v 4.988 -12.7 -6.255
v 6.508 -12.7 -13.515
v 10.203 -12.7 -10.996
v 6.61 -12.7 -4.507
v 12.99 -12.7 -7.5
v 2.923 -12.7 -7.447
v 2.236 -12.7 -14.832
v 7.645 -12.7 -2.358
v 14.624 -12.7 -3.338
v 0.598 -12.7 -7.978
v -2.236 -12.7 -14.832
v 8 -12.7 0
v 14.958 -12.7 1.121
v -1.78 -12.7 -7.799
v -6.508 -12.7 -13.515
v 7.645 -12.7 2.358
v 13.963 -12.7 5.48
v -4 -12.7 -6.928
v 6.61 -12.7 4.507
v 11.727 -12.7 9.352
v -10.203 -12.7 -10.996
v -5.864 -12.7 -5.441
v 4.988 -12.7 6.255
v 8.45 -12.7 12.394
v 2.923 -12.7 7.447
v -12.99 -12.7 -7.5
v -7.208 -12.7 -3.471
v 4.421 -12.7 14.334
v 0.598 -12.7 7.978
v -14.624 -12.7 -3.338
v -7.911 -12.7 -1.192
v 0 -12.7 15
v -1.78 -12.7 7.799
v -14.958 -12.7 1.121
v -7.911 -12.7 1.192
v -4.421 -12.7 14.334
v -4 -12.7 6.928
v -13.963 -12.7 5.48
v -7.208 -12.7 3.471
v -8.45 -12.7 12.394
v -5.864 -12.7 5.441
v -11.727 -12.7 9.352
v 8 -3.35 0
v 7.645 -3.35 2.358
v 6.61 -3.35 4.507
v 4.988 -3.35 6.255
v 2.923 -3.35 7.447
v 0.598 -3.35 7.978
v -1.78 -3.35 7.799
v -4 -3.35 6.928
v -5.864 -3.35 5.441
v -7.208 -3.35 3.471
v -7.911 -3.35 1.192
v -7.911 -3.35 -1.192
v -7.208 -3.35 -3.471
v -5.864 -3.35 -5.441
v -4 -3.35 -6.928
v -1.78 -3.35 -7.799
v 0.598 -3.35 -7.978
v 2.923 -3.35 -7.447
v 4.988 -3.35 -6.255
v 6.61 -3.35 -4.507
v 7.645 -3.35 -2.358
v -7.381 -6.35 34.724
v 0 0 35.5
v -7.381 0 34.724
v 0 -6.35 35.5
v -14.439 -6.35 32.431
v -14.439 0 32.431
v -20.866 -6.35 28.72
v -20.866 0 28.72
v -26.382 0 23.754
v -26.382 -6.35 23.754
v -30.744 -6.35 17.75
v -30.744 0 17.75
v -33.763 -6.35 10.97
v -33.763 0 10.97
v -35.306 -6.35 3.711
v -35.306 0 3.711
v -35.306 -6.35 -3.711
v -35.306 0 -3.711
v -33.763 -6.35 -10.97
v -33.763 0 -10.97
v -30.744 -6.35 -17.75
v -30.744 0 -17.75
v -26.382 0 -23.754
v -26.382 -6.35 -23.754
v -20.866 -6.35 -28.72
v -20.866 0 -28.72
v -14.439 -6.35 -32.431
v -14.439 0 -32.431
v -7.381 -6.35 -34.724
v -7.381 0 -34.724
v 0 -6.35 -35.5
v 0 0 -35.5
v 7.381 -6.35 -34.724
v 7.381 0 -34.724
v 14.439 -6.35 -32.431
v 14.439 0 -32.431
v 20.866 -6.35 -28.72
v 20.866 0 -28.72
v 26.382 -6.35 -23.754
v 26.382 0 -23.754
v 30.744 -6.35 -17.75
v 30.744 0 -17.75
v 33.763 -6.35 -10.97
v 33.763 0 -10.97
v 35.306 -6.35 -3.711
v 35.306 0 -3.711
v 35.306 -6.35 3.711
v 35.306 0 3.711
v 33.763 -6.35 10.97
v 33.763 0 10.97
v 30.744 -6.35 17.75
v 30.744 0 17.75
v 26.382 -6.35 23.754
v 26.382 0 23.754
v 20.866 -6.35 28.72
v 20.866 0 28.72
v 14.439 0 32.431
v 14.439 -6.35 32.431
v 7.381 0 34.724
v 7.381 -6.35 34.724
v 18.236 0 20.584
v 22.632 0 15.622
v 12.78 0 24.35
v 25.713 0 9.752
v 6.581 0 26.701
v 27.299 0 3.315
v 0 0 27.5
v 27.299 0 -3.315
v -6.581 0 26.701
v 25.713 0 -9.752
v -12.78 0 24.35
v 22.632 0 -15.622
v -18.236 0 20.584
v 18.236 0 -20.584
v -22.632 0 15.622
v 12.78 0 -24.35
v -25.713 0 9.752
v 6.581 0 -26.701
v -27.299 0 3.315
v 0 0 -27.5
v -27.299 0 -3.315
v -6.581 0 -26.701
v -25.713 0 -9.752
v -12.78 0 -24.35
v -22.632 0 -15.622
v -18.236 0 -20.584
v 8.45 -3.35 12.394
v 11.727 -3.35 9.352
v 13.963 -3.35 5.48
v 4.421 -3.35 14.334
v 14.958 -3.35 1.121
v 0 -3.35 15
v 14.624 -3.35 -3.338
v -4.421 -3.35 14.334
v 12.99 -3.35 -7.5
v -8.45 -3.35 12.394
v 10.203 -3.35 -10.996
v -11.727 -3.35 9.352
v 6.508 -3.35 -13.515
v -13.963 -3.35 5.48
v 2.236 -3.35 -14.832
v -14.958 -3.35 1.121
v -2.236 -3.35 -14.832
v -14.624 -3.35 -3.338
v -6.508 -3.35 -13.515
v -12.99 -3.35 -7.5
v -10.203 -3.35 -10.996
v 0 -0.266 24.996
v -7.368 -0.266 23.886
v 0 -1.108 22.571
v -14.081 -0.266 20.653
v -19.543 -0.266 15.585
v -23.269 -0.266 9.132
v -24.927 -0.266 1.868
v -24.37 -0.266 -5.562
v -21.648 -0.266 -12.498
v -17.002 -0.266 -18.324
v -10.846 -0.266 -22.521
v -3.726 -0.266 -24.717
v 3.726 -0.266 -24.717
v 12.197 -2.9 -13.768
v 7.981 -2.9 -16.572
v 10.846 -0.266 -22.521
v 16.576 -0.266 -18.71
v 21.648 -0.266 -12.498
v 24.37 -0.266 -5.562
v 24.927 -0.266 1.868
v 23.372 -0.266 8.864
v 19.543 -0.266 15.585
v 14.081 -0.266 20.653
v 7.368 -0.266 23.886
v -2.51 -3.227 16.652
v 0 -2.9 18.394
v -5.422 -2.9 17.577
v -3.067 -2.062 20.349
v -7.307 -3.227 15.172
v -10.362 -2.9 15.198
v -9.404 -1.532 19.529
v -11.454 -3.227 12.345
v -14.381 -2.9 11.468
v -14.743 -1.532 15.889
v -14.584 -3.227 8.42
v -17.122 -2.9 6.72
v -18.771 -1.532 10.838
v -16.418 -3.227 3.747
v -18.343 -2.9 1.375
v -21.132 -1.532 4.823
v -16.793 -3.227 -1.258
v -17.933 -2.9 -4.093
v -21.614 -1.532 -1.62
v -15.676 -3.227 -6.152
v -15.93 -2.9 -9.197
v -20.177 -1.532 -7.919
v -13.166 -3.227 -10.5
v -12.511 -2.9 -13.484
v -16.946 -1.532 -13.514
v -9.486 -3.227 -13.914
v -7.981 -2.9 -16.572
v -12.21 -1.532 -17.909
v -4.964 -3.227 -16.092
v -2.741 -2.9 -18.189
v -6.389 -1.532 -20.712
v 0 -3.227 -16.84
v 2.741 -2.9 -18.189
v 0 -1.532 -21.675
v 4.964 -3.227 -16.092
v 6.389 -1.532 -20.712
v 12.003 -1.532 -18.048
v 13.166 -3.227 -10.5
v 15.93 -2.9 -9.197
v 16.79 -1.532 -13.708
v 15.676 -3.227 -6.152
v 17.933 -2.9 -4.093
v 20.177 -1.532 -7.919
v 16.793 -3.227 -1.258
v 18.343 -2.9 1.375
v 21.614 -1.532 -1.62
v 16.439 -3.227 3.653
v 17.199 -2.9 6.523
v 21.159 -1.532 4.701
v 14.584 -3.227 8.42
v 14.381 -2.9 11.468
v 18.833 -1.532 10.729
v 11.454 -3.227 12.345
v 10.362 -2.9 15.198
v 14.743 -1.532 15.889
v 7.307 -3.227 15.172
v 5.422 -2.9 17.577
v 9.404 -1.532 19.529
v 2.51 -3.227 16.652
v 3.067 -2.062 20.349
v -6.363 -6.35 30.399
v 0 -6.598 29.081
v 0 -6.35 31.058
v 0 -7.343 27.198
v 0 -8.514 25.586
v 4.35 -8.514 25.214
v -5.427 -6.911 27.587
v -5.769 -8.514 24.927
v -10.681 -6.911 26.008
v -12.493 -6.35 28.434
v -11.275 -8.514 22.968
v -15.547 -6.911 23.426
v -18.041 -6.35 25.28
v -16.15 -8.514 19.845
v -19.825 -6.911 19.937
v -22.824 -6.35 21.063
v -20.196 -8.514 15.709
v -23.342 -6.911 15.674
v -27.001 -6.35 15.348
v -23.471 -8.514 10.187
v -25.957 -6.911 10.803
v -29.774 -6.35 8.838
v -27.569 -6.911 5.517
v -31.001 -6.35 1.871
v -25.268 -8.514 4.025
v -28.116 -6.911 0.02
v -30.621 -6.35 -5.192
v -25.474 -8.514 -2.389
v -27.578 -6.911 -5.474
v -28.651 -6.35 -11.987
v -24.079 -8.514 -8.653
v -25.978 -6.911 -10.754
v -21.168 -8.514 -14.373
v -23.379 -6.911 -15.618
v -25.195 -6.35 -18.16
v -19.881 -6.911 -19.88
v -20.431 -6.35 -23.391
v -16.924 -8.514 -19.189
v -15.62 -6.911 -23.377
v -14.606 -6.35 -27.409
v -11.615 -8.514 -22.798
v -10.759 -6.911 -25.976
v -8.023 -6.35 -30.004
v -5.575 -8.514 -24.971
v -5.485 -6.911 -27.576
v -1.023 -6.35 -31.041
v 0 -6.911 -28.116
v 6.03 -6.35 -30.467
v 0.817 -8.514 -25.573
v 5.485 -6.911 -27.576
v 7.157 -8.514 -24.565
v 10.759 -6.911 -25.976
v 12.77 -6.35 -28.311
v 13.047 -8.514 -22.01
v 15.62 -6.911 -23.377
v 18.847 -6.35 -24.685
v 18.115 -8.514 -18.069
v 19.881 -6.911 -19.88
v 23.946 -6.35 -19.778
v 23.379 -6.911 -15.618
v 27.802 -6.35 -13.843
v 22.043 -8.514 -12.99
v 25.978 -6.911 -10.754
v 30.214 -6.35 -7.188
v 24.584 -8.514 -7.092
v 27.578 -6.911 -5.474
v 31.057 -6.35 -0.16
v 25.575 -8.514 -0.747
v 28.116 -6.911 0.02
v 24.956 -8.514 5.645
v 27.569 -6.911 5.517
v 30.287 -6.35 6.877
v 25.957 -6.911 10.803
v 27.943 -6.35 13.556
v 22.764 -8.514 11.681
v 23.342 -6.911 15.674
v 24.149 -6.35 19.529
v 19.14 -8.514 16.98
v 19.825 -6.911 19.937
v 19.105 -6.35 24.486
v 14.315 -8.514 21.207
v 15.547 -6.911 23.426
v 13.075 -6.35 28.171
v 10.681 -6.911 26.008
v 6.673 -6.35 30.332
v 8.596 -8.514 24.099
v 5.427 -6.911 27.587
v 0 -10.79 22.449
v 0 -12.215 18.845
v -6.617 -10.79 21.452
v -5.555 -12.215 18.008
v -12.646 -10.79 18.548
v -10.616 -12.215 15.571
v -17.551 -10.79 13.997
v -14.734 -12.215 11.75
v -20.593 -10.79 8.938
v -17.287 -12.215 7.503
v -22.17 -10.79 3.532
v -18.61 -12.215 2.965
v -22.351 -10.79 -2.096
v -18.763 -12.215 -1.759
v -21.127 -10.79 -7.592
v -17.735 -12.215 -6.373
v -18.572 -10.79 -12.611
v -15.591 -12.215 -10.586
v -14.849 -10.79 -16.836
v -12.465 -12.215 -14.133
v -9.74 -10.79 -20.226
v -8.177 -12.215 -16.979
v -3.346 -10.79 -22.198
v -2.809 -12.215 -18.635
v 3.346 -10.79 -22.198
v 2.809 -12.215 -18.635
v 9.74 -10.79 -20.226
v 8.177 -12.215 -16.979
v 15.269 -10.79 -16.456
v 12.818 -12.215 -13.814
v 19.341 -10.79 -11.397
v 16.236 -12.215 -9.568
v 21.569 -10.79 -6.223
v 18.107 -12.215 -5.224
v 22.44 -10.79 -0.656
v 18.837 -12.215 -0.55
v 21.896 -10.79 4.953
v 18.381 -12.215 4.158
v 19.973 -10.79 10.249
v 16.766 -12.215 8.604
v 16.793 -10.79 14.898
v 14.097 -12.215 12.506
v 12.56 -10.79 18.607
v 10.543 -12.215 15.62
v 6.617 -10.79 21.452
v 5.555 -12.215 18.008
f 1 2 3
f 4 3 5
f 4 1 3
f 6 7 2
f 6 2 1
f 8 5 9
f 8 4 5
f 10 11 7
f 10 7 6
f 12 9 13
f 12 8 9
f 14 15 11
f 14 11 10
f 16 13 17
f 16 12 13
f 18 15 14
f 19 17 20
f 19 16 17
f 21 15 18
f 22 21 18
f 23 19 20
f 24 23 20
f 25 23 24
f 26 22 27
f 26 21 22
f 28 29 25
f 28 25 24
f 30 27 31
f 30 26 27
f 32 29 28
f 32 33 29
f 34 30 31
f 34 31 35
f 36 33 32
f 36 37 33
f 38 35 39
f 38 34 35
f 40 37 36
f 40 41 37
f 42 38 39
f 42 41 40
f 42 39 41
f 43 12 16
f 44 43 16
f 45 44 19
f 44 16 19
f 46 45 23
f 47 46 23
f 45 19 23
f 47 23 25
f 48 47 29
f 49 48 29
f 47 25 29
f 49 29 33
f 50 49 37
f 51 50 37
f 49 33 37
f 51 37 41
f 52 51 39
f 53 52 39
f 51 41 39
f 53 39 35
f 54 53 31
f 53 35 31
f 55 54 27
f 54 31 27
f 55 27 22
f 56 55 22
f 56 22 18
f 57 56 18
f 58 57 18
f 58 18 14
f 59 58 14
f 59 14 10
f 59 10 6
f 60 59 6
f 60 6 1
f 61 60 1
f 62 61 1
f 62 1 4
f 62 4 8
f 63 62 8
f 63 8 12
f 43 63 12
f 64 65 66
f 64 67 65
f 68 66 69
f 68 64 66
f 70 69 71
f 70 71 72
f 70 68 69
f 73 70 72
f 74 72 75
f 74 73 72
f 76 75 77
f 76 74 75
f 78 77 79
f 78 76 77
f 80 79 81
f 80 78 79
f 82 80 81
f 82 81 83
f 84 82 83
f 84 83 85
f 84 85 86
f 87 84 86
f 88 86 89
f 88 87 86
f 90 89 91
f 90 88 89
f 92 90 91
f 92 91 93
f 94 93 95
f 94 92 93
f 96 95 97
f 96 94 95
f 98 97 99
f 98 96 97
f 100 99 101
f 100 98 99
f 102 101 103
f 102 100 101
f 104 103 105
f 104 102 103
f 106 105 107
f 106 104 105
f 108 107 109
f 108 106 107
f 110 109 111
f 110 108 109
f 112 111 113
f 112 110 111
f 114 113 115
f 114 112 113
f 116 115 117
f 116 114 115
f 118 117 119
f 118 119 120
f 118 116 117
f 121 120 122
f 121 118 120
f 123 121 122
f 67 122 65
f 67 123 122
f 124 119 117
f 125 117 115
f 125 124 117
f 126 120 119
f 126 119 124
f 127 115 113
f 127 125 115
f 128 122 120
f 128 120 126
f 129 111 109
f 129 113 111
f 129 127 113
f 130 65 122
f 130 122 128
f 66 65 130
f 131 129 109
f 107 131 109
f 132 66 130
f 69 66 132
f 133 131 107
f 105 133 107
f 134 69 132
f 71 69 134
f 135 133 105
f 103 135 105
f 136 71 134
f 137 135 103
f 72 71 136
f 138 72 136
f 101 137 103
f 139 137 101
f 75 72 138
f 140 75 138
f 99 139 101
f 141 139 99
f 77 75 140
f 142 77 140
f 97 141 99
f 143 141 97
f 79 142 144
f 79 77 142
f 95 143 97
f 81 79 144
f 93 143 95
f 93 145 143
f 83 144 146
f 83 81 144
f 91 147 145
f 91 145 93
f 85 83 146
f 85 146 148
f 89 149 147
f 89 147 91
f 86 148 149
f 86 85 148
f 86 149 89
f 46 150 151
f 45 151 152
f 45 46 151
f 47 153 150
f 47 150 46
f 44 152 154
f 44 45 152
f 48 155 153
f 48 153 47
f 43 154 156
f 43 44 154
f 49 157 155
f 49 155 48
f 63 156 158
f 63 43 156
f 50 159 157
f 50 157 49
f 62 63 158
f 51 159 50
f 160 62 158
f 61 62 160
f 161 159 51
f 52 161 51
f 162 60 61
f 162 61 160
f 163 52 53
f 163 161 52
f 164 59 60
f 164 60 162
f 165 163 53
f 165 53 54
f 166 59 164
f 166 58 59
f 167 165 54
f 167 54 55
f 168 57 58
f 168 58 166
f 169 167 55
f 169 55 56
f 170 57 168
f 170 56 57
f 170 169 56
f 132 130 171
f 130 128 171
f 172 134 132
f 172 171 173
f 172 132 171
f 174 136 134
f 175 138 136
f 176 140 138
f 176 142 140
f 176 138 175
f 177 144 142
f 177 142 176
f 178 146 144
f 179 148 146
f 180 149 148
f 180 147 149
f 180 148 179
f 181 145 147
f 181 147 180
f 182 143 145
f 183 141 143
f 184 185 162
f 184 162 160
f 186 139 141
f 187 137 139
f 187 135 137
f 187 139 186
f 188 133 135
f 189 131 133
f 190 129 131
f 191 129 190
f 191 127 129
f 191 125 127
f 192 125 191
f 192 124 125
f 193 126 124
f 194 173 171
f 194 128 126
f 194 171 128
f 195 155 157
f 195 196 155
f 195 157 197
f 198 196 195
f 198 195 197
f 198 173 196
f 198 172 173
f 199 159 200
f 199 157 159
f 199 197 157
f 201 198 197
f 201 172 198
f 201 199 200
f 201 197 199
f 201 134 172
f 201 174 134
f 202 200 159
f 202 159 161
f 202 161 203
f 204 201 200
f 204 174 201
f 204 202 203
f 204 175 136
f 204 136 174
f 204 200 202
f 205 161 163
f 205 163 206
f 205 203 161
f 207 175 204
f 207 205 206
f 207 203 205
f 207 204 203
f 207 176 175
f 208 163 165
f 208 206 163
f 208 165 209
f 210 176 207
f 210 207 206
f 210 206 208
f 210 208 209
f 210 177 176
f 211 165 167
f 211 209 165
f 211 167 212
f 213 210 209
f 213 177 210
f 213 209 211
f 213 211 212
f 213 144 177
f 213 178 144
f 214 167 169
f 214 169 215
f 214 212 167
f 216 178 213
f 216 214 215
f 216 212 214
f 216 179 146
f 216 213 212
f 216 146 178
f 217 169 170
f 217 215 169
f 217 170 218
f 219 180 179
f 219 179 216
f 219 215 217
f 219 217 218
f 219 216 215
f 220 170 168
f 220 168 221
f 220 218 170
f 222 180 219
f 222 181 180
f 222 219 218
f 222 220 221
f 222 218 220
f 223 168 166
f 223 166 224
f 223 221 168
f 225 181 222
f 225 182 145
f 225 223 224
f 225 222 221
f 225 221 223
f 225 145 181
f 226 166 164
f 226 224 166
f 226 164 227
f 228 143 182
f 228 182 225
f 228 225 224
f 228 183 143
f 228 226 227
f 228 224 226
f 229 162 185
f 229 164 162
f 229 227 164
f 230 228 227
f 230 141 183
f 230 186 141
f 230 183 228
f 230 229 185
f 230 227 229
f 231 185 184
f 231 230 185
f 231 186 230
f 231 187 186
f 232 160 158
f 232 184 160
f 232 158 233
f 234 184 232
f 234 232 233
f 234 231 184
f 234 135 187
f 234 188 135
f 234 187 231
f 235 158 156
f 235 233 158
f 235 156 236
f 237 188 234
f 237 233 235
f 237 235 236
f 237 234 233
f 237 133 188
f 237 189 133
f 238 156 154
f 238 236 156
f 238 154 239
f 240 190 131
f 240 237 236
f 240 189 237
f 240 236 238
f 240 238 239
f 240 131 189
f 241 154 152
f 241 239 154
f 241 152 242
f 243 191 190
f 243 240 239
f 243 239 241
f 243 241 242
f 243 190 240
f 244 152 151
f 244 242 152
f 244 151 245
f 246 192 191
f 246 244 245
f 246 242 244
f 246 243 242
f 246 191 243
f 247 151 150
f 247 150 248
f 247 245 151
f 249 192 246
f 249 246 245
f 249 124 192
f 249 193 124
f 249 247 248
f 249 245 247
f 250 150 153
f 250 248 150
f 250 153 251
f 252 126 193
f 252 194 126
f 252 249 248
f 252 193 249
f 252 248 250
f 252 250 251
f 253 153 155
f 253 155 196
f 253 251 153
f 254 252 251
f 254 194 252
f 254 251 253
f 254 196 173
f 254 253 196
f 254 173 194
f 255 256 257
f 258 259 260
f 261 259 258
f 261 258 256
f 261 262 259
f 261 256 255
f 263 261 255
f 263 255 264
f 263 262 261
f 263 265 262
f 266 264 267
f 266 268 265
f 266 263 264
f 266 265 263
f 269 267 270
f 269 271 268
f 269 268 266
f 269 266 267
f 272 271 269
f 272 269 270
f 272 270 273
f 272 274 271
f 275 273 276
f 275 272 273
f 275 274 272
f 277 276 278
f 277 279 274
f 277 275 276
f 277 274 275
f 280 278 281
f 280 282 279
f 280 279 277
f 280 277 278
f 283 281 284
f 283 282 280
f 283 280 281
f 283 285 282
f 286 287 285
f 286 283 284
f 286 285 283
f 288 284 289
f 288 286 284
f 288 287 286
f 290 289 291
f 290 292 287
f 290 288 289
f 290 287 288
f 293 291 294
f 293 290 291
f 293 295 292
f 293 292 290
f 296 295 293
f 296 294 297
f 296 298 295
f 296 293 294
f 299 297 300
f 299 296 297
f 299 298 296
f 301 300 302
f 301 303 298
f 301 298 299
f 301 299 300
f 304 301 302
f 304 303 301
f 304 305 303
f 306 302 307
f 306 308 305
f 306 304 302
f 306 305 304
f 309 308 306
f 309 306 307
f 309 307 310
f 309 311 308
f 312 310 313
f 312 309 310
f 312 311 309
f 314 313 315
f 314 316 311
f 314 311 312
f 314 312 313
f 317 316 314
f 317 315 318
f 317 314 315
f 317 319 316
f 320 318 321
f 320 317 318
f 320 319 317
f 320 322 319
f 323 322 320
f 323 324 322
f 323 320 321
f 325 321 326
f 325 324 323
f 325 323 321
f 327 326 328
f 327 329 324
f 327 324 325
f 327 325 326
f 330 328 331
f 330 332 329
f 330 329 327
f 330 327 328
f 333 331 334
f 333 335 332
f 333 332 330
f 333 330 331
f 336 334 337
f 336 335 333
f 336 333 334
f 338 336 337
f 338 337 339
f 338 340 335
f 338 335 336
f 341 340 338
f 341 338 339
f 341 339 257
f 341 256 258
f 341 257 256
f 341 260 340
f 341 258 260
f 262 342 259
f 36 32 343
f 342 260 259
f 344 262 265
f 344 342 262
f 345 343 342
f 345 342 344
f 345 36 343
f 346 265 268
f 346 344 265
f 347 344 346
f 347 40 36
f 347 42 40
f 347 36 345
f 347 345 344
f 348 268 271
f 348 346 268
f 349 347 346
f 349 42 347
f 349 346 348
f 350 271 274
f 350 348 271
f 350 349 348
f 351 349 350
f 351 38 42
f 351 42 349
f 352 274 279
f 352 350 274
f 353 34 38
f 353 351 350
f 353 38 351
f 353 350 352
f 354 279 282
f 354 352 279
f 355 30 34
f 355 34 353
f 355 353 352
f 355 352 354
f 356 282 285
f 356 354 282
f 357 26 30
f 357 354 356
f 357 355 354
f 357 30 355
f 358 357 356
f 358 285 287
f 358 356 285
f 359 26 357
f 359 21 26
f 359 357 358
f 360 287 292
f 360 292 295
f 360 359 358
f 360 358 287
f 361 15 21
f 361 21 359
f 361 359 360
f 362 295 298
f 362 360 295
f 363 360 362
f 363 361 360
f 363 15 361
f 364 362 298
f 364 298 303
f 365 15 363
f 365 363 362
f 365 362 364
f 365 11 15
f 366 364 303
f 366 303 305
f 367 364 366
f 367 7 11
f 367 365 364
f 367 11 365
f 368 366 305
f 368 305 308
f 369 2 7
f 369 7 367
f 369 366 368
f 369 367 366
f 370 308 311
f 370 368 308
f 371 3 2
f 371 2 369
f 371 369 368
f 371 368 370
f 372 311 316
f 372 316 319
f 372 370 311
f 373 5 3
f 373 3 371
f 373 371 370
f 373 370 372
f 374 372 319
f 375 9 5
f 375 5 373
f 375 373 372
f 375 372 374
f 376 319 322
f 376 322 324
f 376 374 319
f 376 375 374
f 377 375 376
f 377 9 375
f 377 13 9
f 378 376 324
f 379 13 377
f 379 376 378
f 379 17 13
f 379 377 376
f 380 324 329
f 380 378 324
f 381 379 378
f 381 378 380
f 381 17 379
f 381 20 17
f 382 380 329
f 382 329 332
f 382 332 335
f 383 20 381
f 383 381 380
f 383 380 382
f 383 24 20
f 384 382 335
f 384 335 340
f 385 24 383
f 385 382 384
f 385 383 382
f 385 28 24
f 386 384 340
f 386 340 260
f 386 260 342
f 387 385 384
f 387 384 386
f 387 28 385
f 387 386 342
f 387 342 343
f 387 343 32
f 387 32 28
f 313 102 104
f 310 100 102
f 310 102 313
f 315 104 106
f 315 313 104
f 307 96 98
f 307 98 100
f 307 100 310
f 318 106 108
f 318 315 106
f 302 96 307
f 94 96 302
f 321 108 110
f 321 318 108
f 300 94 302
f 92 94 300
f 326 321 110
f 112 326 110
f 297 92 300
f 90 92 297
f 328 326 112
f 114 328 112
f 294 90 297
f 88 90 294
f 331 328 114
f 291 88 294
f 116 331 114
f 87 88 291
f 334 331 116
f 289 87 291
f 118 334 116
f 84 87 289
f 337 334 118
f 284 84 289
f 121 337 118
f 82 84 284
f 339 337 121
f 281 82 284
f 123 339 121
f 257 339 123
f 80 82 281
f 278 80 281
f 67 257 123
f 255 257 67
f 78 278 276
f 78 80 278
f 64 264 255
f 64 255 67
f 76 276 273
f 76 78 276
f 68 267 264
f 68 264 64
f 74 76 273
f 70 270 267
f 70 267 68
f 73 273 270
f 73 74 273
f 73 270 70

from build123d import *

# Parameters (mm, degrees)
F2_R     = 8
F3_DEPTH = 12.701
F4_R     = 8


with BuildPart() as f1:
    # F0 (on Right) → F1 (revolve)
    with BuildSketch(Plane.YZ):
        with BuildLine():
            Line((-12.7, 15), (-12.7, 0))
            Line((-12.7, 0), (-3.35, 0))
            Line((-3.35, 0), (-3.35, 15))
            add(Edge.make_bspline(
                [(-3.35, 15), (-3.35, 20.828191), (0, 22.027135), (0, 27.5)],
                knots=[0, 0, 0, 0, 12.941117, 12.941117, 12.941117, 12.941117], degree=3))
            Line((0, 27.5), (0, 35.5))
            Line((0, 35.5), (-6.35, 35.5))
            Line((-6.35, 35.5), (-6.35, 27.5))
            ThreePointArc((-6.35, 27.5), (-11.021488, 22.010216), (-12.7, 15))
        make_face()
    revolve(axis=Axis((0, -9.5, 0), (0, -1, 0)))

    # F2 (on face) → F3 (cut, through all)
    with BuildSketch(Plane.XZ.offset(12.7)):
        Circle(F2_R)
    extrude(amount=-F3_DEPTH, mode=Mode.SUBTRACT)

    # F4
    f4_edges = [f1.edges().sort_by_distance(p)[0] for p in [
        (0, -6.35, -27.5),
    ]]
    fillet(f4_edges, radius=F4_R)


solid = f1.part
